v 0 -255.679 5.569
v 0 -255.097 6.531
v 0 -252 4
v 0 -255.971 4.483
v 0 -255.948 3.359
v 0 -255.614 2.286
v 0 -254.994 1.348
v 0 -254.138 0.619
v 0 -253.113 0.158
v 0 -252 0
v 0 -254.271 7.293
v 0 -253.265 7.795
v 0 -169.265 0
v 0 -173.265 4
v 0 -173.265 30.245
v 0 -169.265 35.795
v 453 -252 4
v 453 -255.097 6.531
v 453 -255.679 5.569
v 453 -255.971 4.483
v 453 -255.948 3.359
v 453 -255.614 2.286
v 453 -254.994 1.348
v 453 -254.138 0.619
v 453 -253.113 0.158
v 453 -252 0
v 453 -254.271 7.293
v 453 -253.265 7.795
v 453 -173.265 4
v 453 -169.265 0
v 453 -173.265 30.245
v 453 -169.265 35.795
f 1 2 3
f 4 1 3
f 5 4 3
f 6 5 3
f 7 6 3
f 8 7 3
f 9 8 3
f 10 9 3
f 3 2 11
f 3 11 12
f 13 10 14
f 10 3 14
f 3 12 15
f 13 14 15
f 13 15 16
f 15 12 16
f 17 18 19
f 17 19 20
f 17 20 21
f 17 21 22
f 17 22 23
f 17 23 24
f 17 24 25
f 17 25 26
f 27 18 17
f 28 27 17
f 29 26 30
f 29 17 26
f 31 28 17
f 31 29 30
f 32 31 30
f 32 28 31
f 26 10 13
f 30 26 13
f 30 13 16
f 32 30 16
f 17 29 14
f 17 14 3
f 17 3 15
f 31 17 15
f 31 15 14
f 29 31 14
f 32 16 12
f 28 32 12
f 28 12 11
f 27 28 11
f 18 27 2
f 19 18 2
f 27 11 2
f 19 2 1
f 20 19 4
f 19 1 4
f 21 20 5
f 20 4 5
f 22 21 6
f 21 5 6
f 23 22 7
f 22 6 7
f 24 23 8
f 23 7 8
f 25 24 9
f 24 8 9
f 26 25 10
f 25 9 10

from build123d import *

# Parameters (mm, degrees)
F1_DEPTH = 453


with BuildPart() as f1:
    # F0 (on Right) → F1 (new body)
    with BuildSketch(Plane.YZ):
        with BuildLine():
            Line((-252, 0), (-169.264911, 0))
            Line((-169.264911, 0), (-169.264911, 35.794733))
            Line((-169.264911, 35.794733), (-253.264911, 7.794733))
            ThreePointArc((-253.264911, 7.794733), (-255.94835, 3.359271), (-252, 0))
        make_face()
        Polygon((-252, 4), (-173.264911, 30.24503), (-173.264911, 4), align=None, mode=Mode.SUBTRACT)
    extrude(amount=F1_DEPTH)


solid = f1.part
